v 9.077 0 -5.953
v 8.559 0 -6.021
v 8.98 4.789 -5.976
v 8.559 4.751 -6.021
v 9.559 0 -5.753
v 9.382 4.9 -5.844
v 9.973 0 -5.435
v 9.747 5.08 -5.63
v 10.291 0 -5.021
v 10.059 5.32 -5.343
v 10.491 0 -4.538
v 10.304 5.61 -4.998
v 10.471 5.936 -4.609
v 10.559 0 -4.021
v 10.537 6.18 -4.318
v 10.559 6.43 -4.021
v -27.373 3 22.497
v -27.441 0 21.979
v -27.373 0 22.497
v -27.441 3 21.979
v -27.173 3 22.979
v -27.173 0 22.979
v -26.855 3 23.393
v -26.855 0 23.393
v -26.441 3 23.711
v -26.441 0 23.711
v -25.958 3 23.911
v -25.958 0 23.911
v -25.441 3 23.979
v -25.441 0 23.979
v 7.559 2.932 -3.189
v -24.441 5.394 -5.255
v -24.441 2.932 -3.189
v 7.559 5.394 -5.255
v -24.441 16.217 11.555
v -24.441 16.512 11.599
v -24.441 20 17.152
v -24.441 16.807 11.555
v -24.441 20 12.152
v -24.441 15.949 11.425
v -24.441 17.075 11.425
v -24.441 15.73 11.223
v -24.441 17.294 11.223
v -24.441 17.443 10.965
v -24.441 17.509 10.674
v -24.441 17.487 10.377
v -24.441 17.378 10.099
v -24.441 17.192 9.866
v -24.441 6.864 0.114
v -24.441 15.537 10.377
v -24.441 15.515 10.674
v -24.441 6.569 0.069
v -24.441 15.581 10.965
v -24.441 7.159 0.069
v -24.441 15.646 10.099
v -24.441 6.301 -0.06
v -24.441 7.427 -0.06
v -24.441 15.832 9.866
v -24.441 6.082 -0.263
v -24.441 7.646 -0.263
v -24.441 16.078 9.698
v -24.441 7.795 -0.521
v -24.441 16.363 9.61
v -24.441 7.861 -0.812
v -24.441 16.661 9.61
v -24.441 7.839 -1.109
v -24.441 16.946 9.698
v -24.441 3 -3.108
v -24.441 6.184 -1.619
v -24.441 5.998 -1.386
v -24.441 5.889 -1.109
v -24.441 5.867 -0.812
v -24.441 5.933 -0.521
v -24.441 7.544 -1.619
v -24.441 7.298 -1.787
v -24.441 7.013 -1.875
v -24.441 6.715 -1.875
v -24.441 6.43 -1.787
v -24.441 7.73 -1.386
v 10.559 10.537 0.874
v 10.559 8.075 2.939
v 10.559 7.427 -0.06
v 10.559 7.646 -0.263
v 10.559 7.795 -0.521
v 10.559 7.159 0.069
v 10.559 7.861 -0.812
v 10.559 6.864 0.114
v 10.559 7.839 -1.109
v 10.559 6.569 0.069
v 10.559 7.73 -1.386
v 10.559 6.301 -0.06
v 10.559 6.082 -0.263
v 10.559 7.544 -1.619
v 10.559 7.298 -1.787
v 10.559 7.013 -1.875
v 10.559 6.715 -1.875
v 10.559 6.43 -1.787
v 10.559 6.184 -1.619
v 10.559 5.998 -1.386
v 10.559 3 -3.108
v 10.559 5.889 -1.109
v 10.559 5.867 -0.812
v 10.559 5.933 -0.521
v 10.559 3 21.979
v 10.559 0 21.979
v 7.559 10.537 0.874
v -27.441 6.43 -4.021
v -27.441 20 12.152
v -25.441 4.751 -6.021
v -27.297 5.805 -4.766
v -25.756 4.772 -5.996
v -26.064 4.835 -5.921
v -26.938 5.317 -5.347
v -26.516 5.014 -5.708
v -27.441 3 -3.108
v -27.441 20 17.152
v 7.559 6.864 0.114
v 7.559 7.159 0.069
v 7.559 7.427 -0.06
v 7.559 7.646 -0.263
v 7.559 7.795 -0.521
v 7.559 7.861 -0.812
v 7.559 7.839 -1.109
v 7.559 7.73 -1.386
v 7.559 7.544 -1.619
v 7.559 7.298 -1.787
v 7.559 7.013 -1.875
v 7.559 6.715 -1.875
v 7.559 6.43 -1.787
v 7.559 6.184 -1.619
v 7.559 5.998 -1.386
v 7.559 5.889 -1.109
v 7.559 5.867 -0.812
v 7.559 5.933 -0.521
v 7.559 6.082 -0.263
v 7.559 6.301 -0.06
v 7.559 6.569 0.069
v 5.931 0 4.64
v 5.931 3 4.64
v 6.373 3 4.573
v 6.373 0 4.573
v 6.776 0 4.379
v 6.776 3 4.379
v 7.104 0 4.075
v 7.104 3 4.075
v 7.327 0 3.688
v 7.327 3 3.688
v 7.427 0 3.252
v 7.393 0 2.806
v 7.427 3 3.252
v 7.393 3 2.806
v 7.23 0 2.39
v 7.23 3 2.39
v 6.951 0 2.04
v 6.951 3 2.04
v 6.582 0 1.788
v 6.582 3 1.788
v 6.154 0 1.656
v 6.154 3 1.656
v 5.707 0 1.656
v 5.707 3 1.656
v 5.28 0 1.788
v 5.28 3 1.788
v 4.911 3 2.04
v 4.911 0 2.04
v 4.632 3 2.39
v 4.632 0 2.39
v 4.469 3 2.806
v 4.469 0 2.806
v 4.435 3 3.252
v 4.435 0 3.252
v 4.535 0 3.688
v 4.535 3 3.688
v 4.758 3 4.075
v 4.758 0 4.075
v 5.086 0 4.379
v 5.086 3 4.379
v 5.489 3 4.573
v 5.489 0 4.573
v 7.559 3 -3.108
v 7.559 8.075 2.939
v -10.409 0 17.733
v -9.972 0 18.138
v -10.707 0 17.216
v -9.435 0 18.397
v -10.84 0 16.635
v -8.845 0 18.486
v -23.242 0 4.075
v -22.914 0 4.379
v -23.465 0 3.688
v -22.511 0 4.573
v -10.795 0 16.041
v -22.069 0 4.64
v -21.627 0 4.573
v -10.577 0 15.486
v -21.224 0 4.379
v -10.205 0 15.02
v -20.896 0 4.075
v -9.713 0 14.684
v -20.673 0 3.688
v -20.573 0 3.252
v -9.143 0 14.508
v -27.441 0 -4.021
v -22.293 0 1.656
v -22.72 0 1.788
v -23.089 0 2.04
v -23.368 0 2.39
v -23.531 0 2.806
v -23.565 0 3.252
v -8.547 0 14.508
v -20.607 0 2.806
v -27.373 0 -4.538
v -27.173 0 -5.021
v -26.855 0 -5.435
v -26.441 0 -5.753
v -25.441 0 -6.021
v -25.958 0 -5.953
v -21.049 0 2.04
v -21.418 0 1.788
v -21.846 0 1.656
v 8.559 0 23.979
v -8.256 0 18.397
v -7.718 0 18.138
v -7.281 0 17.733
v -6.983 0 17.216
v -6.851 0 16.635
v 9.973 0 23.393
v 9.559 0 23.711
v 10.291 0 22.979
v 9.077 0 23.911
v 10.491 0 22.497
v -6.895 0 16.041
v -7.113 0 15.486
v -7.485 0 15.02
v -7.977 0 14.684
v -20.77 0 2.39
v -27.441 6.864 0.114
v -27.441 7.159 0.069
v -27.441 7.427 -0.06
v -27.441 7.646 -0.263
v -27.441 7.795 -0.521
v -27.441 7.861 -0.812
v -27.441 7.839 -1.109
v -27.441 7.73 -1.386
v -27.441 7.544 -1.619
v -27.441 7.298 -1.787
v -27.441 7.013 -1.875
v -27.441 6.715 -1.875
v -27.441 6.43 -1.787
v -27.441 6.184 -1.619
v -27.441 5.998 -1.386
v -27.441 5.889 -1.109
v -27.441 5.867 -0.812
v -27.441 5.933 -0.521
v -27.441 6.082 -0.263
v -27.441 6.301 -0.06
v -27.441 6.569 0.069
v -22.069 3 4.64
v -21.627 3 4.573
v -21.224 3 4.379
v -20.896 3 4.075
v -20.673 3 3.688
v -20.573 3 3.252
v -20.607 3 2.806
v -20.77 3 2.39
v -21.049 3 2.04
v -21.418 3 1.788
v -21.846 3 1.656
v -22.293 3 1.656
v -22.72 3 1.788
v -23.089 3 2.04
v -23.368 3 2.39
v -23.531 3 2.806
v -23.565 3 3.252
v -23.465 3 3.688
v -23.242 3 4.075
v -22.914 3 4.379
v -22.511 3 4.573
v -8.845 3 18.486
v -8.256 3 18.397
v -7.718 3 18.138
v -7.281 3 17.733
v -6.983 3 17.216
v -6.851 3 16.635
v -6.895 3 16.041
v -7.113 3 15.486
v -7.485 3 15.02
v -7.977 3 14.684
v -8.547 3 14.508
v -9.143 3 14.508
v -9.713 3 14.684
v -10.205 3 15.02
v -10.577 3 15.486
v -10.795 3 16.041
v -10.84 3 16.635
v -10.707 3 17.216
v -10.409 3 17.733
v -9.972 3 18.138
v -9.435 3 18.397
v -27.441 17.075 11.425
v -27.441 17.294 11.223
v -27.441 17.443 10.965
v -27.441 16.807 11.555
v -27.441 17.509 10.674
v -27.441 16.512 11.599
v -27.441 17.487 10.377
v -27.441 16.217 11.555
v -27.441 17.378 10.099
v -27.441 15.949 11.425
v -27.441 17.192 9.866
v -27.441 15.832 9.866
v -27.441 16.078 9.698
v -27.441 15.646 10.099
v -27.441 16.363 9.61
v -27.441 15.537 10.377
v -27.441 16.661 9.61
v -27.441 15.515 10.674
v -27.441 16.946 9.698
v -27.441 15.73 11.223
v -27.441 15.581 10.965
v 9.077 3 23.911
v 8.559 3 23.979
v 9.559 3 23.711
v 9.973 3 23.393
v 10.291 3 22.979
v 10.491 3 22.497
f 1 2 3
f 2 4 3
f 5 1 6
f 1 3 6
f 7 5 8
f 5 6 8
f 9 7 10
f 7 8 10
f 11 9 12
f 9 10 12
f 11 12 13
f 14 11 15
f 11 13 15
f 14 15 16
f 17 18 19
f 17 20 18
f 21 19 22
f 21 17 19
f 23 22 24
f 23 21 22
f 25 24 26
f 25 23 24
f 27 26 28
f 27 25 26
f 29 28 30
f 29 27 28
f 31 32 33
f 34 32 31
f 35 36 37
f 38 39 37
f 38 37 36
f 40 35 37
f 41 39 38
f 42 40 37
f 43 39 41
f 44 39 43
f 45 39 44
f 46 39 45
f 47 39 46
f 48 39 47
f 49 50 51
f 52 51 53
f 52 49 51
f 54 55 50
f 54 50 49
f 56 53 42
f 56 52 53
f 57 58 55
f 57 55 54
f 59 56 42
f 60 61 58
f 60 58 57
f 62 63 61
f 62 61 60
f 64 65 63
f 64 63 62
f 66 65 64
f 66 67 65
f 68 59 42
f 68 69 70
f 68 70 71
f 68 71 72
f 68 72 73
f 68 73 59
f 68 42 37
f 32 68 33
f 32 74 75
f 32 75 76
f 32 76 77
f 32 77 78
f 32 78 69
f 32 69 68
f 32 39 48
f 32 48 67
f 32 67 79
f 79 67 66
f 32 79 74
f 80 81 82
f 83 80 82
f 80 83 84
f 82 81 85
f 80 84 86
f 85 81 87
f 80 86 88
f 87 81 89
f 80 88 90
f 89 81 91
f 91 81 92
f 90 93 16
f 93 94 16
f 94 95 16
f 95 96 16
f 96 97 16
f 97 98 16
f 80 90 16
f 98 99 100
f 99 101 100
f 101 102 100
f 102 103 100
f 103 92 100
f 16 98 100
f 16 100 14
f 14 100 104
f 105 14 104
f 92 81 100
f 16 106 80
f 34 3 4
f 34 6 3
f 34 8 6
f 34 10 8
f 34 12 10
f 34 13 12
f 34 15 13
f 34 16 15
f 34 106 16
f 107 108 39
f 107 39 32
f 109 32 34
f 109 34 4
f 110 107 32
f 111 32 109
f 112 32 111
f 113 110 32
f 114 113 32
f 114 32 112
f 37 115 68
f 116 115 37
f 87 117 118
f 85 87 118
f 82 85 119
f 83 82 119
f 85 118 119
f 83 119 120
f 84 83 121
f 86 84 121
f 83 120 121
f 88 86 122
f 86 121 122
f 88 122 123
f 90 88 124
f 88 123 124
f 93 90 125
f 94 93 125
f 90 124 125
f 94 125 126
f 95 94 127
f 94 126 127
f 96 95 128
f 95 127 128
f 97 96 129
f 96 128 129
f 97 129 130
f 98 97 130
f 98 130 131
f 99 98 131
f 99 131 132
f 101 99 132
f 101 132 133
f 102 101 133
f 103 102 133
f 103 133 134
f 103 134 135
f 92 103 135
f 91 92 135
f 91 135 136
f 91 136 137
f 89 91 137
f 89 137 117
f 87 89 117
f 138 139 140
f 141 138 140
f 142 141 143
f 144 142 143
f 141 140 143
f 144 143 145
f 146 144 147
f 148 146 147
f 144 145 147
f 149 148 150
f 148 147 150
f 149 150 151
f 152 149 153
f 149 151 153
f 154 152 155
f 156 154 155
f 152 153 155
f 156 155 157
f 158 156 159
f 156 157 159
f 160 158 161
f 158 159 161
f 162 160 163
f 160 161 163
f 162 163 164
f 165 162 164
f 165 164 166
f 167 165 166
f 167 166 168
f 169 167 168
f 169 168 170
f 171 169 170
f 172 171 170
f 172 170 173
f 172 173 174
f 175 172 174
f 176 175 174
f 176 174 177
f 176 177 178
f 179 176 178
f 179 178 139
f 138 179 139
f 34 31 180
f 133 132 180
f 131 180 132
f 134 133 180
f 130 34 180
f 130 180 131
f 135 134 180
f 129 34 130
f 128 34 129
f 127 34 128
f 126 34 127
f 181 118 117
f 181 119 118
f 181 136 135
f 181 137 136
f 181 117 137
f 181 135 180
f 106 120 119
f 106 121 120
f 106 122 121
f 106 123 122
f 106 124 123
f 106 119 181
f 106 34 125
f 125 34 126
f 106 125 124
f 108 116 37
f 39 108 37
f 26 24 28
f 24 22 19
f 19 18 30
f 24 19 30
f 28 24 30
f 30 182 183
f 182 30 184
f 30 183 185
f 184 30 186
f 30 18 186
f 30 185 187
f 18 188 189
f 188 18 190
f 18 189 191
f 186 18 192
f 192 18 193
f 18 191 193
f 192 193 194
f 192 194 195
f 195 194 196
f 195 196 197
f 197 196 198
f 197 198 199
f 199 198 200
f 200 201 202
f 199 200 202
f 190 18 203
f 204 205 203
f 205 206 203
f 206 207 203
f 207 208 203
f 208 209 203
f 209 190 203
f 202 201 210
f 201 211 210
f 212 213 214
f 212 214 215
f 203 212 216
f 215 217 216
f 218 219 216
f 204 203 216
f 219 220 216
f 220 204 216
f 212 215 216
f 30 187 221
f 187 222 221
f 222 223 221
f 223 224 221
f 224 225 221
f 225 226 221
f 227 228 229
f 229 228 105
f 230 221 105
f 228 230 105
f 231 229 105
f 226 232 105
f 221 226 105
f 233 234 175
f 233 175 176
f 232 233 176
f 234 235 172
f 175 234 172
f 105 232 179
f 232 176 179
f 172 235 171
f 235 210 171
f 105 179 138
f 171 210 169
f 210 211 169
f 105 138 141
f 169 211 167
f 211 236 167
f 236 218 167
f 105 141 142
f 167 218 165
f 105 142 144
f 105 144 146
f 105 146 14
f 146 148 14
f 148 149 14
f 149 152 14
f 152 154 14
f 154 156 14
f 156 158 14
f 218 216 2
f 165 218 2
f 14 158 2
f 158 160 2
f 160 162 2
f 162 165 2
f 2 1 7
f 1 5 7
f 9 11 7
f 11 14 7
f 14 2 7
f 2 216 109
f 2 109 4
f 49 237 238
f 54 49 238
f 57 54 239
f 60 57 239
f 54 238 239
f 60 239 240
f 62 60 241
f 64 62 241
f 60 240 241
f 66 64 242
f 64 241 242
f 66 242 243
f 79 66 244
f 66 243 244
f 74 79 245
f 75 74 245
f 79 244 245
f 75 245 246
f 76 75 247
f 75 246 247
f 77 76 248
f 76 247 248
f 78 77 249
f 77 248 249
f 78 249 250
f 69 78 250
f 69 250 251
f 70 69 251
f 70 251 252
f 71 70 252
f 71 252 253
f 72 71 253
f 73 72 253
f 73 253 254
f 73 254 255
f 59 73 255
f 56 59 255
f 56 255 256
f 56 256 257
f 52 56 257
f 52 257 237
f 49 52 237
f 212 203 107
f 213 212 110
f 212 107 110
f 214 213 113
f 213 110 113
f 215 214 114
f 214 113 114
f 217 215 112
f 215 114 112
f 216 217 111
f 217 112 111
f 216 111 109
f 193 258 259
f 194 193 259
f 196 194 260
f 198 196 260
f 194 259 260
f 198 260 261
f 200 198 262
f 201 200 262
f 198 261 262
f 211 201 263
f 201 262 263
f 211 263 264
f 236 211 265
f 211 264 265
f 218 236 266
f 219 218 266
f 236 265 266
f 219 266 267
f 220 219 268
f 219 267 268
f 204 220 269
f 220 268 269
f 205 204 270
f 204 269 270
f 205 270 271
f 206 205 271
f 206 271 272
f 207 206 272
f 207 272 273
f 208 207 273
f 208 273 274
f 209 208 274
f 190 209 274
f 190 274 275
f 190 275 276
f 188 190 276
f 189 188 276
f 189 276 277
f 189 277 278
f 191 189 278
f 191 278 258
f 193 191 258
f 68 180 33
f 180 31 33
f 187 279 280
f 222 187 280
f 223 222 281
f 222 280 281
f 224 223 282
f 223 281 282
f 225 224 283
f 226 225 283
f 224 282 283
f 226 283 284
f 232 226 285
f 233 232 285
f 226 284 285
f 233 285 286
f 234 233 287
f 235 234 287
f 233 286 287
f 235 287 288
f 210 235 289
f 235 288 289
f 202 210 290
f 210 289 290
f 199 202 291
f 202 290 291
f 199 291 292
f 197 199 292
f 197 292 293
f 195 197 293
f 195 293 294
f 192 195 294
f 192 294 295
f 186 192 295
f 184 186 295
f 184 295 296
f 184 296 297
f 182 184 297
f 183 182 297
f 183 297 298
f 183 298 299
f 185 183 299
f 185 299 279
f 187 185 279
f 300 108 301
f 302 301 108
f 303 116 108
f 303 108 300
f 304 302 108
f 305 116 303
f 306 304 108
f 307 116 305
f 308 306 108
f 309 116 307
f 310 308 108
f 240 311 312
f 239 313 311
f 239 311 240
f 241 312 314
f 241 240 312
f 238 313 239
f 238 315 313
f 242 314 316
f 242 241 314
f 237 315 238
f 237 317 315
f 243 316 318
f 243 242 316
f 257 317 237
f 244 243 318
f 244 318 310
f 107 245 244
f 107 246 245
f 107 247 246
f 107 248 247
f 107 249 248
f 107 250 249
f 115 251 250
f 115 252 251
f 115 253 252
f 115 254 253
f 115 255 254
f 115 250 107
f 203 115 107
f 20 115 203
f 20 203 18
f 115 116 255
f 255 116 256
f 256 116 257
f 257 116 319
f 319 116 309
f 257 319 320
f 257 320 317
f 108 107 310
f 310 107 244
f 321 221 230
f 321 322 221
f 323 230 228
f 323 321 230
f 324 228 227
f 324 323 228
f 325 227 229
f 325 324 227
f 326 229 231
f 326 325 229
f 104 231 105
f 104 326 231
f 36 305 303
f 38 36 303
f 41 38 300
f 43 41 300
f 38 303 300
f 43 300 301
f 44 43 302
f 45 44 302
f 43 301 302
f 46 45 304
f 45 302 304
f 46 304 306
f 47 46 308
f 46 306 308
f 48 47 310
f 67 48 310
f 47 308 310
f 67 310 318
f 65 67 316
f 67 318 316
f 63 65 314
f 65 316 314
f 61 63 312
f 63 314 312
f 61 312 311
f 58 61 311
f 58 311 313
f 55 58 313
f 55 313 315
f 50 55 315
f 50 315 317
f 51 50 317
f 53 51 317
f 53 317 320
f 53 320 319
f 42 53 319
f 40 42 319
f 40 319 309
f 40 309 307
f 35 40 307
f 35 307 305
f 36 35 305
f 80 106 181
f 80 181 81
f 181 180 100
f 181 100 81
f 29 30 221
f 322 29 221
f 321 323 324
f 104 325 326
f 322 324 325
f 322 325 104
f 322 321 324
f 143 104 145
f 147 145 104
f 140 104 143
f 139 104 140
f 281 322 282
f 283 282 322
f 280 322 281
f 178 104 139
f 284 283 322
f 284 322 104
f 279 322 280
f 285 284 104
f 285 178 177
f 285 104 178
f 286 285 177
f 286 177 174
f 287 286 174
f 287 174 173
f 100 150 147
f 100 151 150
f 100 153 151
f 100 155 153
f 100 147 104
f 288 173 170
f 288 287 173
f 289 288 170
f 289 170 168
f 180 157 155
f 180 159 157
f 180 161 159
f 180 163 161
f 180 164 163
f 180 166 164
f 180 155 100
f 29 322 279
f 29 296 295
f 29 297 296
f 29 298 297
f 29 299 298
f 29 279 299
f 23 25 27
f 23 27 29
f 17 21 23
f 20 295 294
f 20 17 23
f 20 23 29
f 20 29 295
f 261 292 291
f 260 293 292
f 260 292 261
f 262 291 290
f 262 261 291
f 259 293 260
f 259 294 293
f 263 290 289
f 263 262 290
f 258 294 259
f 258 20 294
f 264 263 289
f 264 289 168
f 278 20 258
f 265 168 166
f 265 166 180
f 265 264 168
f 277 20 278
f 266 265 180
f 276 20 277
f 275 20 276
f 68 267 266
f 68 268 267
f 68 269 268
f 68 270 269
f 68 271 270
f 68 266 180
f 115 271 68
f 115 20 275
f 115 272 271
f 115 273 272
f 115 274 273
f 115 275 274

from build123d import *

# Parameters (mm, degrees)
SKETCH_1_W          = 38
SKETCH_1_H          = 30
EXTRUDE_1_DEPTH     = 20
SKETCH_2_OUTSIDE_W  = 42.476
SKETCH_2_OUTSIDE_H  = 32.476
CUT_EXTRUDE_1_DEPTH = 50.18334813
CUT_EXTRUDE_2_DEPTH = 3.213938048
SKETCH_5_R          = 1
CUT_EXTRUDE_3_DEPTH = 50.18334813
SKETCH_6_R          = 2
CUT_EXTRUDE_4_DEPTH = 41.211951058
SKETCH_7_R          = 1.5
CUT_EXTRUDE_5_DEPTH = 41.211951058
FILLET_1_R          = 2


with BuildPart() as part:
    # 草图1 → 凸台-拉伸1 (new body)
    with BuildSketch(Plane(origin=(0, 0, 0), x_dir=(1, 0, 0), z_dir=(0, 1, 0))):
        with Locations((-8.44083225, -8.979193758)):
            Rectangle(SKETCH_1_W, SKETCH_1_H)
    extrude(amount=EXTRUDE_1_DEPTH)

    # 草图2 outside → 切除-拉伸1 (cut, through all)
    with BuildSketch(Plane.ZY.offset(27.44083225)):
        with Locations((8.979, 10)):
            Rectangle(SKETCH_2_OUTSIDE_W, SKETCH_2_OUTSIDE_H)
        Polygon((23.979193758, 3), (-3.108138222, 3), (17.151672852, 20), (12.151672852, 20), (-6.020806242, 4.751479495), (-6.020806242, 0), (23.979193758, 0), align=None, mode=Mode.SUBTRACT)
    extrude(amount=-CUT_EXTRUDE_1_DEPTH, mode=Mode.SUBTRACT)

    # 草图4 → 切除-拉伸2 (cut)
    with BuildSketch(Plane(origin=(0, 5.752950958, -4.827299027), x_dir=(1, 0, 0), z_dir=(0, 0.7660444431189813, -0.6427876096865356))):
        Polygon((-24.44083225, -25.994695872), (-24.44083225, 0.558013018), (7.55916775, 0.558013018), (7.55916775, -7.441986982), (10.55916775, -7.441986982), (10.55916775, -25.994695872), align=None)
    extrude(amount=-CUT_EXTRUDE_2_DEPTH, mode=Mode.SUBTRACT)

    # 草图5 → 切除-拉伸3 (cut, through all)
    with BuildSketch(Plane.ZY.offset(27.44083225)):
        with Locations((-0.886376682, 6.863996586)):
            Circle(SKETCH_5_R)
        with Locations((10.599170775, 16.511908257)):
            Circle(SKETCH_5_R)
    extrude(amount=-CUT_EXTRUDE_3_DEPTH, mode=Mode.SUBTRACT)

    # 草图6 → 切除-拉伸4 (cut, through all)
    with BuildSketch(Plane(origin=(0, 3, 0), x_dir=(1, 0, 0), z_dir=(0, 1, 0))):
        with Locations(Location((-8.84513683, -16.485782133, 0), (0, 0, 270))):
            Circle(SKETCH_6_R)
    extrude(amount=-CUT_EXTRUDE_4_DEPTH, mode=Mode.SUBTRACT)

    # 草图7 → 切除-拉伸5 (cut, through all)
    with BuildSketch(Plane(origin=(0, 3, 0), x_dir=(1, 0, 0), z_dir=(0, 1, 0))):
        with Locations(Location((-22.069088403, -3.139744133, 0), (0, 0, 270))):
            Circle(SKETCH_7_R)
        with Locations(Location((5.930911597, -3.139744133, 0), (0, 0, 270))):
            Circle(SKETCH_7_R)
    extrude(amount=-CUT_EXTRUDE_5_DEPTH, mode=Mode.SUBTRACT)

    # 圆角1
    fillet_1_edges = [part.edges().sort_by_distance(p)[0] for p in [
        (-27.44083225, 2.375739747, -6.020806242),
        (10.55916775, 2.375739747, -6.020806242),
        (10.55916775, 1.5, 23.979193758),
        (-27.44083225, 1.5, 23.979193758),
    ]]
    fillet(fillet_1_edges, radius=FILLET_1_R)


solid = part.part
